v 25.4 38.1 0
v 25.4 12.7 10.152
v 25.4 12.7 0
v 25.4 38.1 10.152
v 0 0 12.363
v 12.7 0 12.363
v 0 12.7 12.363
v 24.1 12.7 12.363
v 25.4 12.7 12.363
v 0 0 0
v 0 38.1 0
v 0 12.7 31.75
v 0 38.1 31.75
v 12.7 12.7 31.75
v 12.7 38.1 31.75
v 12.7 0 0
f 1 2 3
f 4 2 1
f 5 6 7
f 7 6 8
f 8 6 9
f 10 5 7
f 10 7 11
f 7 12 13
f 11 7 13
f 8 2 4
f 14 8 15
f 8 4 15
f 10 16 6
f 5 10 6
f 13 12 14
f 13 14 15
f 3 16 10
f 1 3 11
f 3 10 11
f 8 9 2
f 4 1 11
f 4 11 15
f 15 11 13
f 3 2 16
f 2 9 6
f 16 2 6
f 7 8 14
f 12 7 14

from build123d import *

# Parameters (mm, degrees)
F0_W     = 38.1
F0_H     = 31.75
F1_DEPTH = 25.4
F2_W     = 12.7
F2_H     = 19.3866453245
F3_DEPTH = 25.4
F5_DEPTH = 25.4
F7_DEPTH = 25.4


with BuildPart() as f1:
    # F0 (on Right) → F1 (new body)
    with BuildSketch(Plane.YZ):
        with Locations((19.05, 15.875)):
            Rectangle(F0_W, F0_H)
    extrude(amount=F1_DEPTH)

    # F2 (on face) → F3 (cut)
    with BuildSketch(Plane.YZ.offset(25.4)):
        with Locations((6.35, 22.0566773377)):
            Rectangle(F2_W, F2_H)
    extrude(amount=-F3_DEPTH, mode=Mode.SUBTRACT)

    # F4 (on face) → F5 (cut)
    with BuildSketch(Plane(origin=(0, 38.1, 0), x_dir=(-1, 0, 0), z_dir=(0, 1, 0))):
        Polygon((-25.4, 10.1520223543), (-12.7, 31.75), (-25.4, 31.75), align=None)
    extrude(amount=-F5_DEPTH, mode=Mode.SUBTRACT)

    # F6 (on face) → F7 (cut)
    with BuildSketch(Plane.XY.offset(12.3633546755)):
        Polygon((25.4, 0), (25.4, 12.7), (12.7, 0), align=None)
    extrude(amount=-F7_DEPTH, mode=Mode.SUBTRACT)


solid = f1.part
